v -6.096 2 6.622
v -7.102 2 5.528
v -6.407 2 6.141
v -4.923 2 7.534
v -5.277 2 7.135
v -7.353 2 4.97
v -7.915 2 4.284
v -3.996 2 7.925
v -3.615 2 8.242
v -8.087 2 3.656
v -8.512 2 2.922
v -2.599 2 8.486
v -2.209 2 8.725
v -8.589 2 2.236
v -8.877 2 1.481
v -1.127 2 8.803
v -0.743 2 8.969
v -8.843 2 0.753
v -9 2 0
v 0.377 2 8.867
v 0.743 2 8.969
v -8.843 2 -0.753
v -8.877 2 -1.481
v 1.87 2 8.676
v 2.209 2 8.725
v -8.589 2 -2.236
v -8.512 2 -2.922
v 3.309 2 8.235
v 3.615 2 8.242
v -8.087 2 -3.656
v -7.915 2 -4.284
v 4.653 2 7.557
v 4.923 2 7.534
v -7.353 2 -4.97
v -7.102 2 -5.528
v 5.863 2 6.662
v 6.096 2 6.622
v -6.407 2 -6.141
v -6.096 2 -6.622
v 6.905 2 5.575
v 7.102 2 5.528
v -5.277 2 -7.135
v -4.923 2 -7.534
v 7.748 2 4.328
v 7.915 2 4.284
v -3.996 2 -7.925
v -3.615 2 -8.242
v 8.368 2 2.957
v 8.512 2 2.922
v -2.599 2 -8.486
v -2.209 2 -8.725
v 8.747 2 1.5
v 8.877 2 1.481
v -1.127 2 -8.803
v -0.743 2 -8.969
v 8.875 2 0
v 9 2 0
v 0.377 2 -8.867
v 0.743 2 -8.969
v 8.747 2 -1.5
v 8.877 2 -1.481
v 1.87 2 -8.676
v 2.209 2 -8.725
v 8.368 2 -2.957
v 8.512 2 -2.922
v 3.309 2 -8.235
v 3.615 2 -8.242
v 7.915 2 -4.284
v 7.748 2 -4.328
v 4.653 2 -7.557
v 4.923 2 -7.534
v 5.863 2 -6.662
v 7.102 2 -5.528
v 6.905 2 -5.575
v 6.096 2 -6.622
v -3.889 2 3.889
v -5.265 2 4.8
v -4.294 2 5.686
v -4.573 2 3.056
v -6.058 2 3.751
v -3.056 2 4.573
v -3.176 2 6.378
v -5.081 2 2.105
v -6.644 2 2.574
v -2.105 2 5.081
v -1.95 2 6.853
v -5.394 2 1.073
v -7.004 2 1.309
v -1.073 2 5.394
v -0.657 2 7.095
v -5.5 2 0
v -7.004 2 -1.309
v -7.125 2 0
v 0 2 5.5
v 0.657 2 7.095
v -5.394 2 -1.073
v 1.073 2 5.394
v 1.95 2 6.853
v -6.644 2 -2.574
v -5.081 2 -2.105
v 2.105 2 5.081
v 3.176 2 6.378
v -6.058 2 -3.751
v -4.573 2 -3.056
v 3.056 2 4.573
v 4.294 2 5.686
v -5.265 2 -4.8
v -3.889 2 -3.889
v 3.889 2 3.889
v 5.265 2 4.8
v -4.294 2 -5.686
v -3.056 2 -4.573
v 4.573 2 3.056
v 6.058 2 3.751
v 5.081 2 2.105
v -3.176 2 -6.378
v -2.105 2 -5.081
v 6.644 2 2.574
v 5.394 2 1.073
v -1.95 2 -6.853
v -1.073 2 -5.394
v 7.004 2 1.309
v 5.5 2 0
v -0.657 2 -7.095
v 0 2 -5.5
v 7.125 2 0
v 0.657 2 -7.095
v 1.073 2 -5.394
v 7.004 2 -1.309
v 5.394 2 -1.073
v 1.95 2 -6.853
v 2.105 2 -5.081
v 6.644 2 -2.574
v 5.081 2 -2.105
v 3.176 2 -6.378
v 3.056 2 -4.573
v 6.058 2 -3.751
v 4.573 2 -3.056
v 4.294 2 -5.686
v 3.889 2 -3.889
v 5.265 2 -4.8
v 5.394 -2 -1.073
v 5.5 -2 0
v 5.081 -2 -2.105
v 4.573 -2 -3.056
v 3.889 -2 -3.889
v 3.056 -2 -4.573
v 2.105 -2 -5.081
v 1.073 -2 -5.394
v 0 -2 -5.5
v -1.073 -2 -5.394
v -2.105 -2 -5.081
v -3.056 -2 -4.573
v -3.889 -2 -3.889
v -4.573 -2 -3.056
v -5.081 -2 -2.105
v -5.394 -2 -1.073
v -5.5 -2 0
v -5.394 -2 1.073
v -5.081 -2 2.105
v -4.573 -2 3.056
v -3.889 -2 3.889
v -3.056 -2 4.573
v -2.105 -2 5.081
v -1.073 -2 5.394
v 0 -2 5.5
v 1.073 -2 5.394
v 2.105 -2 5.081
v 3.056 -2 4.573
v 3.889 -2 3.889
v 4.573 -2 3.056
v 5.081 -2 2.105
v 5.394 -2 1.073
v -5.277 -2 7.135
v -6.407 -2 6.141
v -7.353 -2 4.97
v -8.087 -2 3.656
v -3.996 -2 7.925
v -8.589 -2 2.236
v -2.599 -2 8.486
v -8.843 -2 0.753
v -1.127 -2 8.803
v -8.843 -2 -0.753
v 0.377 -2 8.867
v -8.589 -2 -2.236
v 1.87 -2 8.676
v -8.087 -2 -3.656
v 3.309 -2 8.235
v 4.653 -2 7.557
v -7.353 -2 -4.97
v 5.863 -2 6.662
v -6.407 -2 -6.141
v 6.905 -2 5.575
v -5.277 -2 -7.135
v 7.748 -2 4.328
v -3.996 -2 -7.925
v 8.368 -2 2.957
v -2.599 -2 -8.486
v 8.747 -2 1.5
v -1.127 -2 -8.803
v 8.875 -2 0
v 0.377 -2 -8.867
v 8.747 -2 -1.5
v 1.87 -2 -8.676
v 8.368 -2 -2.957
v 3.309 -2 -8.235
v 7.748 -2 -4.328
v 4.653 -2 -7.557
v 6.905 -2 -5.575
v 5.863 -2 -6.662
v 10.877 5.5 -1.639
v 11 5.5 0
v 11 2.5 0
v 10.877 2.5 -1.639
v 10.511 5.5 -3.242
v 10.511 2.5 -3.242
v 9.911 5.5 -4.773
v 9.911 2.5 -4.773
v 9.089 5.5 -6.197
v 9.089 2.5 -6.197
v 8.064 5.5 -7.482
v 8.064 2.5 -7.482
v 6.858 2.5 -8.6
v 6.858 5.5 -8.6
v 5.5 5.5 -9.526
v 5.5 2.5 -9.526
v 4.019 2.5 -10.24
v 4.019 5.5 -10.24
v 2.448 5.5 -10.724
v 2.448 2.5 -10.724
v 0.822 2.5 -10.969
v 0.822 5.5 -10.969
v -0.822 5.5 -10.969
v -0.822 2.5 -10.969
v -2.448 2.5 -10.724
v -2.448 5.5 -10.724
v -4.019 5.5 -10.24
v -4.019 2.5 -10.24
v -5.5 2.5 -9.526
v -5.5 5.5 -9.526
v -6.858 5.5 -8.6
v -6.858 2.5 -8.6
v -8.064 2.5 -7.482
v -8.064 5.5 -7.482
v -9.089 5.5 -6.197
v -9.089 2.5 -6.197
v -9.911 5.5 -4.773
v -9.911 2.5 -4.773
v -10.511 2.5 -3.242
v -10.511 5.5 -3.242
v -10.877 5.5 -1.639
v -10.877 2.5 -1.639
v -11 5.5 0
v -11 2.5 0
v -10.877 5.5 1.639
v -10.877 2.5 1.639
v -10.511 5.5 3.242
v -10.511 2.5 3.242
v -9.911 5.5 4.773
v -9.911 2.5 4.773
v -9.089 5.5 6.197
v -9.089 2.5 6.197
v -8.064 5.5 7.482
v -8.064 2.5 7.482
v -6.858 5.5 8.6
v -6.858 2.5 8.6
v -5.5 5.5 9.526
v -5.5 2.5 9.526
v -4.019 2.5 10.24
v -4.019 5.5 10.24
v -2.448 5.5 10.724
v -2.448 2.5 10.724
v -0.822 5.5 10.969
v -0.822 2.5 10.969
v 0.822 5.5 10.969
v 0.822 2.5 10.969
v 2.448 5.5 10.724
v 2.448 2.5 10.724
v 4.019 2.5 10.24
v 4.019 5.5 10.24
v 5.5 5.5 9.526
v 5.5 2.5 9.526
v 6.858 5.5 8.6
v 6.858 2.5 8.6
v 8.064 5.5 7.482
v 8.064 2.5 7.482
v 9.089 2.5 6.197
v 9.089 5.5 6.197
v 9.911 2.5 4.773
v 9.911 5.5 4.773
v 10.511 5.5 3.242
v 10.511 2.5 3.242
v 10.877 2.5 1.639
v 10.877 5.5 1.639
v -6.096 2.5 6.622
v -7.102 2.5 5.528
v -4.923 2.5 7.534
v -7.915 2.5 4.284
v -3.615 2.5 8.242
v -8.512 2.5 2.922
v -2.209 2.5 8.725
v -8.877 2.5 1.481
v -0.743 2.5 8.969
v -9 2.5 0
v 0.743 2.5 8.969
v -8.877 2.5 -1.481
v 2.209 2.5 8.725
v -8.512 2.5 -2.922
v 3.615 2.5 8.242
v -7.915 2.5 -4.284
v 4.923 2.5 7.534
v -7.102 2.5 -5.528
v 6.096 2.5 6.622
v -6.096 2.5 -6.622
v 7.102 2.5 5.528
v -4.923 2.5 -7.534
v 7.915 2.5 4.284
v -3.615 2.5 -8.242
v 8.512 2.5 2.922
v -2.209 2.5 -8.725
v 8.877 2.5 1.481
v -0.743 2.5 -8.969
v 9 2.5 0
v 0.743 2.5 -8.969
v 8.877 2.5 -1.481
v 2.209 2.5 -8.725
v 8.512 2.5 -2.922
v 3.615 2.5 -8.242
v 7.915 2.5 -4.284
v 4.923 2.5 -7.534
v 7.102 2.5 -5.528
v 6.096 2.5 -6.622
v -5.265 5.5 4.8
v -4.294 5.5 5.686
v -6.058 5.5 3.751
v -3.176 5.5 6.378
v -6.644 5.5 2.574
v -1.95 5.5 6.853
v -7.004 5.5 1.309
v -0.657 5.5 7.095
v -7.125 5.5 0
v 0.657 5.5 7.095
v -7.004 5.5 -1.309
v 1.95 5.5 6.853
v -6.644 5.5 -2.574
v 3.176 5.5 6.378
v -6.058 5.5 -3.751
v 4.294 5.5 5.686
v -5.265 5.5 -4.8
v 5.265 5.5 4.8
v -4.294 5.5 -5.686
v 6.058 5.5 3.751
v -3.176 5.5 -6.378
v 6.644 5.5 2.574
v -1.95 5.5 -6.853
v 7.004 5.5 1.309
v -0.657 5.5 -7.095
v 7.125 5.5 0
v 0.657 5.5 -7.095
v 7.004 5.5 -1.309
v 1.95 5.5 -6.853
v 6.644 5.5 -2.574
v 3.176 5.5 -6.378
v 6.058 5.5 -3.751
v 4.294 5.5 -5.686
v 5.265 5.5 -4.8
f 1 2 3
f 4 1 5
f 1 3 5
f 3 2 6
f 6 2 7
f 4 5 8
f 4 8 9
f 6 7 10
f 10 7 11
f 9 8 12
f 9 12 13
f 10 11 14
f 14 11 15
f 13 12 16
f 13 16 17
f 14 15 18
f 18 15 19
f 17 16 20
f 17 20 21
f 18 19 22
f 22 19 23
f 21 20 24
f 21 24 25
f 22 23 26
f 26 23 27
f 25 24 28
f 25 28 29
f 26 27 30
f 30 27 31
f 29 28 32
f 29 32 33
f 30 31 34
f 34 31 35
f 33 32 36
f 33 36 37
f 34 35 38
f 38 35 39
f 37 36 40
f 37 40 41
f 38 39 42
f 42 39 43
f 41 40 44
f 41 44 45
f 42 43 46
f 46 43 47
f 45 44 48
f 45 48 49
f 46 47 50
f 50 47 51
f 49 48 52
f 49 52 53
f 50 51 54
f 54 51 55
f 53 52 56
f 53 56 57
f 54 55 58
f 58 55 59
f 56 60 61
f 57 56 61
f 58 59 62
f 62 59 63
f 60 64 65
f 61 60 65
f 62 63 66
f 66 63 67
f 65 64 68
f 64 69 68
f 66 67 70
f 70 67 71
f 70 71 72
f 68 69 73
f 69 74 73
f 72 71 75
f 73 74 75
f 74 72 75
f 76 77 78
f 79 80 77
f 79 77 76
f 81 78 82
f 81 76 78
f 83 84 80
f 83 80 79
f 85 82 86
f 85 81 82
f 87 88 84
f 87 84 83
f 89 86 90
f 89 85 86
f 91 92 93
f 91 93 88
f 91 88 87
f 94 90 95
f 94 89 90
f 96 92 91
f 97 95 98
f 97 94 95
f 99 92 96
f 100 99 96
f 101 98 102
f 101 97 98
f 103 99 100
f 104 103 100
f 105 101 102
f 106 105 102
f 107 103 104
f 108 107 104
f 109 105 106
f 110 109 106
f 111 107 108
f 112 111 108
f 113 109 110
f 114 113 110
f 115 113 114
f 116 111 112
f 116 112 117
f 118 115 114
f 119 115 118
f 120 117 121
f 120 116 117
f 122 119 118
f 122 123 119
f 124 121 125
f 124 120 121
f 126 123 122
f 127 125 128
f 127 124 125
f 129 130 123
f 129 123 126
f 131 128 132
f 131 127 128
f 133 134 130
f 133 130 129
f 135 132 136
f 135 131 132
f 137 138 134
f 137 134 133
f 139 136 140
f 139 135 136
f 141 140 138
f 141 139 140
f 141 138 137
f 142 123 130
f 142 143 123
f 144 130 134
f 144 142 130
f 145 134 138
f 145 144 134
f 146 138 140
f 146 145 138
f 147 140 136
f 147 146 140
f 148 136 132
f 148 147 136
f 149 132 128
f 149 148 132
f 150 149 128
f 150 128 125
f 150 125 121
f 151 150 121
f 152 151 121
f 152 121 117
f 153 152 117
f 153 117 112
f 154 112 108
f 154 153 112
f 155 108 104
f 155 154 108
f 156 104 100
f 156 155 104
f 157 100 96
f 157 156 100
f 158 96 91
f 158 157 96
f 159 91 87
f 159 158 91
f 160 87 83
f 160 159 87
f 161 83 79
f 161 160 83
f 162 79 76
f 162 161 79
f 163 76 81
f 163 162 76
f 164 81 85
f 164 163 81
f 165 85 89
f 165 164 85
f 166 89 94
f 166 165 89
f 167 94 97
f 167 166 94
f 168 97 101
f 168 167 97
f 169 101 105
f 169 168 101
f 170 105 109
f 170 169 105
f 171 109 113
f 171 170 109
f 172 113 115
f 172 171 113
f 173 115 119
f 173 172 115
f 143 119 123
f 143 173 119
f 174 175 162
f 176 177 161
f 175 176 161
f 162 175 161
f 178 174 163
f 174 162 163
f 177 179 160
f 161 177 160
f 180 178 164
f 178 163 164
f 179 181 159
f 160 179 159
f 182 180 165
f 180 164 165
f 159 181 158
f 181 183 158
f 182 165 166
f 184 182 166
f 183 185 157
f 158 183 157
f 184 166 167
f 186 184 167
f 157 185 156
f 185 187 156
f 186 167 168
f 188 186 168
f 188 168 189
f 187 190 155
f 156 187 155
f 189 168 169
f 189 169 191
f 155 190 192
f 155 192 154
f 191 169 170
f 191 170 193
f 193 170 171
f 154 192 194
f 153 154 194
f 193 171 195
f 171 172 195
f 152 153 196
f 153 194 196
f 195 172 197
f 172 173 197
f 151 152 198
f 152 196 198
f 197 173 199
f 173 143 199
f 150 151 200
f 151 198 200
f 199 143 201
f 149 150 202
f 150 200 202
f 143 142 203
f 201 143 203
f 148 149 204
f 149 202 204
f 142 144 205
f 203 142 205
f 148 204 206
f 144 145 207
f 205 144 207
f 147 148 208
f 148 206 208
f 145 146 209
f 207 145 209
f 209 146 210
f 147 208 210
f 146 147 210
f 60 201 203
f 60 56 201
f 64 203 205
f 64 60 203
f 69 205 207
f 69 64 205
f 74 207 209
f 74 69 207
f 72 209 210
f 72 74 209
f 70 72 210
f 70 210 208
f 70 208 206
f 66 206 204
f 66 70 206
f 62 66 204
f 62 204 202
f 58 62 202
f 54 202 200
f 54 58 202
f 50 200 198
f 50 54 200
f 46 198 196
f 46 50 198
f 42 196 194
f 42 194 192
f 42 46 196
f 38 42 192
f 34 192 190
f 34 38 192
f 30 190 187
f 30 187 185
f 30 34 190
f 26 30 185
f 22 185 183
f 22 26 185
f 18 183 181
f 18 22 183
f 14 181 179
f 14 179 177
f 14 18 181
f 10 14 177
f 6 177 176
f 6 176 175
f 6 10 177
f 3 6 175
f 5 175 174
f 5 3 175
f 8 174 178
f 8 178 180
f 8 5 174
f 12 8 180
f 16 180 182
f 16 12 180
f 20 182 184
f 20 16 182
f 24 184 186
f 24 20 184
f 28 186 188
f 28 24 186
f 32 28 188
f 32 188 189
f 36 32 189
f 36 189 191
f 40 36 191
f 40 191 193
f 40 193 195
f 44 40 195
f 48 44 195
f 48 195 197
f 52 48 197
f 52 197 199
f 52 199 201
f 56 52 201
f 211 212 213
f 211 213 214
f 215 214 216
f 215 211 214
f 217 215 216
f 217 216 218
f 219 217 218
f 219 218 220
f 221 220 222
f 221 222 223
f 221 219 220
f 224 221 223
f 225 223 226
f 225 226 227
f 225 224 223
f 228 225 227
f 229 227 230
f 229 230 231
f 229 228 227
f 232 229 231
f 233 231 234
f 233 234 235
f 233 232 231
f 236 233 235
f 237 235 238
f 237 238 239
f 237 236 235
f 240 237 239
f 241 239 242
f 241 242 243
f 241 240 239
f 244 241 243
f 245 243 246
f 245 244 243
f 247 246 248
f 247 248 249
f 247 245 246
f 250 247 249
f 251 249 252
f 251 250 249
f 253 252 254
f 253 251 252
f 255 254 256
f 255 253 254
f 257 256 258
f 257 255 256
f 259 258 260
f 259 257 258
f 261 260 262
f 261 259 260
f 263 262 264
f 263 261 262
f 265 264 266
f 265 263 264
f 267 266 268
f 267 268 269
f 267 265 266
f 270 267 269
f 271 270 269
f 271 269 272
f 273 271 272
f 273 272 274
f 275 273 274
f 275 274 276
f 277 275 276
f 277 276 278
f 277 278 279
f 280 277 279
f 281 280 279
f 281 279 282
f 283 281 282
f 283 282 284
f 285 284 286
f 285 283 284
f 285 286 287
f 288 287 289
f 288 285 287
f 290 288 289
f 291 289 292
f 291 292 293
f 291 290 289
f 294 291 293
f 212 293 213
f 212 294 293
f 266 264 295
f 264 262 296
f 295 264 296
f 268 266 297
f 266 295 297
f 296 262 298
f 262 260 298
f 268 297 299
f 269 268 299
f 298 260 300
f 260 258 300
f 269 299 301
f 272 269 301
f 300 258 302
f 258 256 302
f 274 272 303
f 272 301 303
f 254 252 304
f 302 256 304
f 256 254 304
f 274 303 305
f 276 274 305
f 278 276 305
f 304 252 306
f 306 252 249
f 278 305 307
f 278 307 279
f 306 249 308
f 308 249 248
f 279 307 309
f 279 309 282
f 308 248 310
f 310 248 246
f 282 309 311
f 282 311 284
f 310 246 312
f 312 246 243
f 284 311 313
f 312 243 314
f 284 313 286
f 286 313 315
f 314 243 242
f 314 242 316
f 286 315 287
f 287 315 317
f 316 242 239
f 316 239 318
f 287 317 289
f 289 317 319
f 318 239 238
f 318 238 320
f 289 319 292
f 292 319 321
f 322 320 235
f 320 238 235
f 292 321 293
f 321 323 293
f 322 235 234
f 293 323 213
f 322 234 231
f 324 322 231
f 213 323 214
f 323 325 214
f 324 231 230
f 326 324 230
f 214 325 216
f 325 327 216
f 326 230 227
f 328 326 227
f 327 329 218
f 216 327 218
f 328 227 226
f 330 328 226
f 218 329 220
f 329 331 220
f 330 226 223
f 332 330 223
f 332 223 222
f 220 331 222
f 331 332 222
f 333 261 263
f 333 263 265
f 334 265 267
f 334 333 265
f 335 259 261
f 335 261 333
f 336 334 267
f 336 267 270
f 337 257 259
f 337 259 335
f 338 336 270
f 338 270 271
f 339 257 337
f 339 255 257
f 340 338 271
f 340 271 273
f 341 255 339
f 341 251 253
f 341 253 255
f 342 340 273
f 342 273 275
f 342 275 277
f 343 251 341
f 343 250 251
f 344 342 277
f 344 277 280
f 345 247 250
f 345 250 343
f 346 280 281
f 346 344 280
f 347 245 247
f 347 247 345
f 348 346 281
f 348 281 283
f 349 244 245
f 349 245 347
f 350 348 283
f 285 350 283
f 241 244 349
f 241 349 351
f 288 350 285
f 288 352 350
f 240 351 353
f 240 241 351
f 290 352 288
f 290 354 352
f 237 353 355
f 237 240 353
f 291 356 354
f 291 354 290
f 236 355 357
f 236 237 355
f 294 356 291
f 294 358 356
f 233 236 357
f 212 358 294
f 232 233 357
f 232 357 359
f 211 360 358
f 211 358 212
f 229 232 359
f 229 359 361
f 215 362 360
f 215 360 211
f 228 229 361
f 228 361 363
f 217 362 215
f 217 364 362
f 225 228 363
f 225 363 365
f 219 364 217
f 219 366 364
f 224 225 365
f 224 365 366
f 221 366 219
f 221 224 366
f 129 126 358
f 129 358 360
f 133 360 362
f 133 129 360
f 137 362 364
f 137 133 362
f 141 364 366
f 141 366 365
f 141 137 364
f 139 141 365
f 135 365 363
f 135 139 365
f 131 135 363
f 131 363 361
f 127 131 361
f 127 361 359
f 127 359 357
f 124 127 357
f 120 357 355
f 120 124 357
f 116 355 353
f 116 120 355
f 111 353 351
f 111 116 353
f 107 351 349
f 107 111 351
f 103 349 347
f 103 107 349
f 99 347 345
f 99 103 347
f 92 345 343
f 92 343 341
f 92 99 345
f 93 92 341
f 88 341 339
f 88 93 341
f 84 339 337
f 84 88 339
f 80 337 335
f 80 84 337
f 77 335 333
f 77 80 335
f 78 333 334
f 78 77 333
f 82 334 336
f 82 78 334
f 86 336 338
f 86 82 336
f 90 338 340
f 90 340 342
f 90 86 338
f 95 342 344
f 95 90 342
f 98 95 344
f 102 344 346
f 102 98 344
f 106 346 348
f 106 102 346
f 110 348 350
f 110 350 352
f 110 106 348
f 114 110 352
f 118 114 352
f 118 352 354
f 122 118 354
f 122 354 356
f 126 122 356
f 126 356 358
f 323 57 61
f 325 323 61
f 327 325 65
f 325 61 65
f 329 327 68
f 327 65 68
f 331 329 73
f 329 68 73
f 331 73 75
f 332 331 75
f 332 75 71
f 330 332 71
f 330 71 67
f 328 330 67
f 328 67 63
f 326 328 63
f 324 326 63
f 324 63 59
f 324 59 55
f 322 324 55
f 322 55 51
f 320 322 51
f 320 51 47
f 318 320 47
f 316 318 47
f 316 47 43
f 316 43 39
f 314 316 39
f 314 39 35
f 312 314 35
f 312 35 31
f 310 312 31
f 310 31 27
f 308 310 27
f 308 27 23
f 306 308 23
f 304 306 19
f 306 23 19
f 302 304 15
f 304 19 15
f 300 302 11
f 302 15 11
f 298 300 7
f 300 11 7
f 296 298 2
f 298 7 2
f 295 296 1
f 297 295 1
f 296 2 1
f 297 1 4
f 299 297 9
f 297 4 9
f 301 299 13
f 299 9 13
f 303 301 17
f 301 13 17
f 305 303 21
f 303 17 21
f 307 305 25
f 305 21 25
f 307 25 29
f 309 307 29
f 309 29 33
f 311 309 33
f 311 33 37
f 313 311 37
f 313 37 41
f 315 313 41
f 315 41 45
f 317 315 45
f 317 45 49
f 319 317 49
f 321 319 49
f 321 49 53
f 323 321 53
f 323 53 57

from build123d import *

# Parameters (mm, degrees)
SKETCH1_R           = 8.875
SKETCH1_R_2         = 5.5
BOSS_EXTRUDE1_DEPTH = 2
SKETCH2_R           = 9
SKETCH2_R_2         = 7.125
BOSS_EXTRUDE2_DEPTH = 3.5
SKETCH3_R           = 11
SKETCH3_R_2         = 9
BOSS_EXTRUDE3_DEPTH = 3


with BuildPart() as part:
    # Sketch1 → Boss-Extrude1 (new body, symmetric)
    with BuildSketch(Plane(origin=(0, 0, 0), x_dir=(1, 0, 0), z_dir=(0, 1, 0))):
        Circle(SKETCH1_R)
        Circle(SKETCH1_R_2, mode=Mode.SUBTRACT)
    extrude(amount=BOSS_EXTRUDE1_DEPTH, both=True)

    # Sketch2 → Boss-Extrude2 (add)
    with BuildSketch(Plane(origin=(0, 2, 0), x_dir=(1, 0, 0), z_dir=(0, 1, 0))):
        Circle(SKETCH2_R)
        Circle(SKETCH2_R_2, mode=Mode.SUBTRACT)
    extrude(amount=BOSS_EXTRUDE2_DEPTH)

    # Sketch3 → Boss-Extrude3 (add)
    with BuildSketch(Plane(origin=(0, 5.5, 0), x_dir=(1, 0, 0), z_dir=(0, 1, 0))):
        Circle(SKETCH3_R)
        Circle(SKETCH3_R_2, mode=Mode.SUBTRACT)
    extrude(amount=-BOSS_EXTRUDE3_DEPTH)


solid = part.part
